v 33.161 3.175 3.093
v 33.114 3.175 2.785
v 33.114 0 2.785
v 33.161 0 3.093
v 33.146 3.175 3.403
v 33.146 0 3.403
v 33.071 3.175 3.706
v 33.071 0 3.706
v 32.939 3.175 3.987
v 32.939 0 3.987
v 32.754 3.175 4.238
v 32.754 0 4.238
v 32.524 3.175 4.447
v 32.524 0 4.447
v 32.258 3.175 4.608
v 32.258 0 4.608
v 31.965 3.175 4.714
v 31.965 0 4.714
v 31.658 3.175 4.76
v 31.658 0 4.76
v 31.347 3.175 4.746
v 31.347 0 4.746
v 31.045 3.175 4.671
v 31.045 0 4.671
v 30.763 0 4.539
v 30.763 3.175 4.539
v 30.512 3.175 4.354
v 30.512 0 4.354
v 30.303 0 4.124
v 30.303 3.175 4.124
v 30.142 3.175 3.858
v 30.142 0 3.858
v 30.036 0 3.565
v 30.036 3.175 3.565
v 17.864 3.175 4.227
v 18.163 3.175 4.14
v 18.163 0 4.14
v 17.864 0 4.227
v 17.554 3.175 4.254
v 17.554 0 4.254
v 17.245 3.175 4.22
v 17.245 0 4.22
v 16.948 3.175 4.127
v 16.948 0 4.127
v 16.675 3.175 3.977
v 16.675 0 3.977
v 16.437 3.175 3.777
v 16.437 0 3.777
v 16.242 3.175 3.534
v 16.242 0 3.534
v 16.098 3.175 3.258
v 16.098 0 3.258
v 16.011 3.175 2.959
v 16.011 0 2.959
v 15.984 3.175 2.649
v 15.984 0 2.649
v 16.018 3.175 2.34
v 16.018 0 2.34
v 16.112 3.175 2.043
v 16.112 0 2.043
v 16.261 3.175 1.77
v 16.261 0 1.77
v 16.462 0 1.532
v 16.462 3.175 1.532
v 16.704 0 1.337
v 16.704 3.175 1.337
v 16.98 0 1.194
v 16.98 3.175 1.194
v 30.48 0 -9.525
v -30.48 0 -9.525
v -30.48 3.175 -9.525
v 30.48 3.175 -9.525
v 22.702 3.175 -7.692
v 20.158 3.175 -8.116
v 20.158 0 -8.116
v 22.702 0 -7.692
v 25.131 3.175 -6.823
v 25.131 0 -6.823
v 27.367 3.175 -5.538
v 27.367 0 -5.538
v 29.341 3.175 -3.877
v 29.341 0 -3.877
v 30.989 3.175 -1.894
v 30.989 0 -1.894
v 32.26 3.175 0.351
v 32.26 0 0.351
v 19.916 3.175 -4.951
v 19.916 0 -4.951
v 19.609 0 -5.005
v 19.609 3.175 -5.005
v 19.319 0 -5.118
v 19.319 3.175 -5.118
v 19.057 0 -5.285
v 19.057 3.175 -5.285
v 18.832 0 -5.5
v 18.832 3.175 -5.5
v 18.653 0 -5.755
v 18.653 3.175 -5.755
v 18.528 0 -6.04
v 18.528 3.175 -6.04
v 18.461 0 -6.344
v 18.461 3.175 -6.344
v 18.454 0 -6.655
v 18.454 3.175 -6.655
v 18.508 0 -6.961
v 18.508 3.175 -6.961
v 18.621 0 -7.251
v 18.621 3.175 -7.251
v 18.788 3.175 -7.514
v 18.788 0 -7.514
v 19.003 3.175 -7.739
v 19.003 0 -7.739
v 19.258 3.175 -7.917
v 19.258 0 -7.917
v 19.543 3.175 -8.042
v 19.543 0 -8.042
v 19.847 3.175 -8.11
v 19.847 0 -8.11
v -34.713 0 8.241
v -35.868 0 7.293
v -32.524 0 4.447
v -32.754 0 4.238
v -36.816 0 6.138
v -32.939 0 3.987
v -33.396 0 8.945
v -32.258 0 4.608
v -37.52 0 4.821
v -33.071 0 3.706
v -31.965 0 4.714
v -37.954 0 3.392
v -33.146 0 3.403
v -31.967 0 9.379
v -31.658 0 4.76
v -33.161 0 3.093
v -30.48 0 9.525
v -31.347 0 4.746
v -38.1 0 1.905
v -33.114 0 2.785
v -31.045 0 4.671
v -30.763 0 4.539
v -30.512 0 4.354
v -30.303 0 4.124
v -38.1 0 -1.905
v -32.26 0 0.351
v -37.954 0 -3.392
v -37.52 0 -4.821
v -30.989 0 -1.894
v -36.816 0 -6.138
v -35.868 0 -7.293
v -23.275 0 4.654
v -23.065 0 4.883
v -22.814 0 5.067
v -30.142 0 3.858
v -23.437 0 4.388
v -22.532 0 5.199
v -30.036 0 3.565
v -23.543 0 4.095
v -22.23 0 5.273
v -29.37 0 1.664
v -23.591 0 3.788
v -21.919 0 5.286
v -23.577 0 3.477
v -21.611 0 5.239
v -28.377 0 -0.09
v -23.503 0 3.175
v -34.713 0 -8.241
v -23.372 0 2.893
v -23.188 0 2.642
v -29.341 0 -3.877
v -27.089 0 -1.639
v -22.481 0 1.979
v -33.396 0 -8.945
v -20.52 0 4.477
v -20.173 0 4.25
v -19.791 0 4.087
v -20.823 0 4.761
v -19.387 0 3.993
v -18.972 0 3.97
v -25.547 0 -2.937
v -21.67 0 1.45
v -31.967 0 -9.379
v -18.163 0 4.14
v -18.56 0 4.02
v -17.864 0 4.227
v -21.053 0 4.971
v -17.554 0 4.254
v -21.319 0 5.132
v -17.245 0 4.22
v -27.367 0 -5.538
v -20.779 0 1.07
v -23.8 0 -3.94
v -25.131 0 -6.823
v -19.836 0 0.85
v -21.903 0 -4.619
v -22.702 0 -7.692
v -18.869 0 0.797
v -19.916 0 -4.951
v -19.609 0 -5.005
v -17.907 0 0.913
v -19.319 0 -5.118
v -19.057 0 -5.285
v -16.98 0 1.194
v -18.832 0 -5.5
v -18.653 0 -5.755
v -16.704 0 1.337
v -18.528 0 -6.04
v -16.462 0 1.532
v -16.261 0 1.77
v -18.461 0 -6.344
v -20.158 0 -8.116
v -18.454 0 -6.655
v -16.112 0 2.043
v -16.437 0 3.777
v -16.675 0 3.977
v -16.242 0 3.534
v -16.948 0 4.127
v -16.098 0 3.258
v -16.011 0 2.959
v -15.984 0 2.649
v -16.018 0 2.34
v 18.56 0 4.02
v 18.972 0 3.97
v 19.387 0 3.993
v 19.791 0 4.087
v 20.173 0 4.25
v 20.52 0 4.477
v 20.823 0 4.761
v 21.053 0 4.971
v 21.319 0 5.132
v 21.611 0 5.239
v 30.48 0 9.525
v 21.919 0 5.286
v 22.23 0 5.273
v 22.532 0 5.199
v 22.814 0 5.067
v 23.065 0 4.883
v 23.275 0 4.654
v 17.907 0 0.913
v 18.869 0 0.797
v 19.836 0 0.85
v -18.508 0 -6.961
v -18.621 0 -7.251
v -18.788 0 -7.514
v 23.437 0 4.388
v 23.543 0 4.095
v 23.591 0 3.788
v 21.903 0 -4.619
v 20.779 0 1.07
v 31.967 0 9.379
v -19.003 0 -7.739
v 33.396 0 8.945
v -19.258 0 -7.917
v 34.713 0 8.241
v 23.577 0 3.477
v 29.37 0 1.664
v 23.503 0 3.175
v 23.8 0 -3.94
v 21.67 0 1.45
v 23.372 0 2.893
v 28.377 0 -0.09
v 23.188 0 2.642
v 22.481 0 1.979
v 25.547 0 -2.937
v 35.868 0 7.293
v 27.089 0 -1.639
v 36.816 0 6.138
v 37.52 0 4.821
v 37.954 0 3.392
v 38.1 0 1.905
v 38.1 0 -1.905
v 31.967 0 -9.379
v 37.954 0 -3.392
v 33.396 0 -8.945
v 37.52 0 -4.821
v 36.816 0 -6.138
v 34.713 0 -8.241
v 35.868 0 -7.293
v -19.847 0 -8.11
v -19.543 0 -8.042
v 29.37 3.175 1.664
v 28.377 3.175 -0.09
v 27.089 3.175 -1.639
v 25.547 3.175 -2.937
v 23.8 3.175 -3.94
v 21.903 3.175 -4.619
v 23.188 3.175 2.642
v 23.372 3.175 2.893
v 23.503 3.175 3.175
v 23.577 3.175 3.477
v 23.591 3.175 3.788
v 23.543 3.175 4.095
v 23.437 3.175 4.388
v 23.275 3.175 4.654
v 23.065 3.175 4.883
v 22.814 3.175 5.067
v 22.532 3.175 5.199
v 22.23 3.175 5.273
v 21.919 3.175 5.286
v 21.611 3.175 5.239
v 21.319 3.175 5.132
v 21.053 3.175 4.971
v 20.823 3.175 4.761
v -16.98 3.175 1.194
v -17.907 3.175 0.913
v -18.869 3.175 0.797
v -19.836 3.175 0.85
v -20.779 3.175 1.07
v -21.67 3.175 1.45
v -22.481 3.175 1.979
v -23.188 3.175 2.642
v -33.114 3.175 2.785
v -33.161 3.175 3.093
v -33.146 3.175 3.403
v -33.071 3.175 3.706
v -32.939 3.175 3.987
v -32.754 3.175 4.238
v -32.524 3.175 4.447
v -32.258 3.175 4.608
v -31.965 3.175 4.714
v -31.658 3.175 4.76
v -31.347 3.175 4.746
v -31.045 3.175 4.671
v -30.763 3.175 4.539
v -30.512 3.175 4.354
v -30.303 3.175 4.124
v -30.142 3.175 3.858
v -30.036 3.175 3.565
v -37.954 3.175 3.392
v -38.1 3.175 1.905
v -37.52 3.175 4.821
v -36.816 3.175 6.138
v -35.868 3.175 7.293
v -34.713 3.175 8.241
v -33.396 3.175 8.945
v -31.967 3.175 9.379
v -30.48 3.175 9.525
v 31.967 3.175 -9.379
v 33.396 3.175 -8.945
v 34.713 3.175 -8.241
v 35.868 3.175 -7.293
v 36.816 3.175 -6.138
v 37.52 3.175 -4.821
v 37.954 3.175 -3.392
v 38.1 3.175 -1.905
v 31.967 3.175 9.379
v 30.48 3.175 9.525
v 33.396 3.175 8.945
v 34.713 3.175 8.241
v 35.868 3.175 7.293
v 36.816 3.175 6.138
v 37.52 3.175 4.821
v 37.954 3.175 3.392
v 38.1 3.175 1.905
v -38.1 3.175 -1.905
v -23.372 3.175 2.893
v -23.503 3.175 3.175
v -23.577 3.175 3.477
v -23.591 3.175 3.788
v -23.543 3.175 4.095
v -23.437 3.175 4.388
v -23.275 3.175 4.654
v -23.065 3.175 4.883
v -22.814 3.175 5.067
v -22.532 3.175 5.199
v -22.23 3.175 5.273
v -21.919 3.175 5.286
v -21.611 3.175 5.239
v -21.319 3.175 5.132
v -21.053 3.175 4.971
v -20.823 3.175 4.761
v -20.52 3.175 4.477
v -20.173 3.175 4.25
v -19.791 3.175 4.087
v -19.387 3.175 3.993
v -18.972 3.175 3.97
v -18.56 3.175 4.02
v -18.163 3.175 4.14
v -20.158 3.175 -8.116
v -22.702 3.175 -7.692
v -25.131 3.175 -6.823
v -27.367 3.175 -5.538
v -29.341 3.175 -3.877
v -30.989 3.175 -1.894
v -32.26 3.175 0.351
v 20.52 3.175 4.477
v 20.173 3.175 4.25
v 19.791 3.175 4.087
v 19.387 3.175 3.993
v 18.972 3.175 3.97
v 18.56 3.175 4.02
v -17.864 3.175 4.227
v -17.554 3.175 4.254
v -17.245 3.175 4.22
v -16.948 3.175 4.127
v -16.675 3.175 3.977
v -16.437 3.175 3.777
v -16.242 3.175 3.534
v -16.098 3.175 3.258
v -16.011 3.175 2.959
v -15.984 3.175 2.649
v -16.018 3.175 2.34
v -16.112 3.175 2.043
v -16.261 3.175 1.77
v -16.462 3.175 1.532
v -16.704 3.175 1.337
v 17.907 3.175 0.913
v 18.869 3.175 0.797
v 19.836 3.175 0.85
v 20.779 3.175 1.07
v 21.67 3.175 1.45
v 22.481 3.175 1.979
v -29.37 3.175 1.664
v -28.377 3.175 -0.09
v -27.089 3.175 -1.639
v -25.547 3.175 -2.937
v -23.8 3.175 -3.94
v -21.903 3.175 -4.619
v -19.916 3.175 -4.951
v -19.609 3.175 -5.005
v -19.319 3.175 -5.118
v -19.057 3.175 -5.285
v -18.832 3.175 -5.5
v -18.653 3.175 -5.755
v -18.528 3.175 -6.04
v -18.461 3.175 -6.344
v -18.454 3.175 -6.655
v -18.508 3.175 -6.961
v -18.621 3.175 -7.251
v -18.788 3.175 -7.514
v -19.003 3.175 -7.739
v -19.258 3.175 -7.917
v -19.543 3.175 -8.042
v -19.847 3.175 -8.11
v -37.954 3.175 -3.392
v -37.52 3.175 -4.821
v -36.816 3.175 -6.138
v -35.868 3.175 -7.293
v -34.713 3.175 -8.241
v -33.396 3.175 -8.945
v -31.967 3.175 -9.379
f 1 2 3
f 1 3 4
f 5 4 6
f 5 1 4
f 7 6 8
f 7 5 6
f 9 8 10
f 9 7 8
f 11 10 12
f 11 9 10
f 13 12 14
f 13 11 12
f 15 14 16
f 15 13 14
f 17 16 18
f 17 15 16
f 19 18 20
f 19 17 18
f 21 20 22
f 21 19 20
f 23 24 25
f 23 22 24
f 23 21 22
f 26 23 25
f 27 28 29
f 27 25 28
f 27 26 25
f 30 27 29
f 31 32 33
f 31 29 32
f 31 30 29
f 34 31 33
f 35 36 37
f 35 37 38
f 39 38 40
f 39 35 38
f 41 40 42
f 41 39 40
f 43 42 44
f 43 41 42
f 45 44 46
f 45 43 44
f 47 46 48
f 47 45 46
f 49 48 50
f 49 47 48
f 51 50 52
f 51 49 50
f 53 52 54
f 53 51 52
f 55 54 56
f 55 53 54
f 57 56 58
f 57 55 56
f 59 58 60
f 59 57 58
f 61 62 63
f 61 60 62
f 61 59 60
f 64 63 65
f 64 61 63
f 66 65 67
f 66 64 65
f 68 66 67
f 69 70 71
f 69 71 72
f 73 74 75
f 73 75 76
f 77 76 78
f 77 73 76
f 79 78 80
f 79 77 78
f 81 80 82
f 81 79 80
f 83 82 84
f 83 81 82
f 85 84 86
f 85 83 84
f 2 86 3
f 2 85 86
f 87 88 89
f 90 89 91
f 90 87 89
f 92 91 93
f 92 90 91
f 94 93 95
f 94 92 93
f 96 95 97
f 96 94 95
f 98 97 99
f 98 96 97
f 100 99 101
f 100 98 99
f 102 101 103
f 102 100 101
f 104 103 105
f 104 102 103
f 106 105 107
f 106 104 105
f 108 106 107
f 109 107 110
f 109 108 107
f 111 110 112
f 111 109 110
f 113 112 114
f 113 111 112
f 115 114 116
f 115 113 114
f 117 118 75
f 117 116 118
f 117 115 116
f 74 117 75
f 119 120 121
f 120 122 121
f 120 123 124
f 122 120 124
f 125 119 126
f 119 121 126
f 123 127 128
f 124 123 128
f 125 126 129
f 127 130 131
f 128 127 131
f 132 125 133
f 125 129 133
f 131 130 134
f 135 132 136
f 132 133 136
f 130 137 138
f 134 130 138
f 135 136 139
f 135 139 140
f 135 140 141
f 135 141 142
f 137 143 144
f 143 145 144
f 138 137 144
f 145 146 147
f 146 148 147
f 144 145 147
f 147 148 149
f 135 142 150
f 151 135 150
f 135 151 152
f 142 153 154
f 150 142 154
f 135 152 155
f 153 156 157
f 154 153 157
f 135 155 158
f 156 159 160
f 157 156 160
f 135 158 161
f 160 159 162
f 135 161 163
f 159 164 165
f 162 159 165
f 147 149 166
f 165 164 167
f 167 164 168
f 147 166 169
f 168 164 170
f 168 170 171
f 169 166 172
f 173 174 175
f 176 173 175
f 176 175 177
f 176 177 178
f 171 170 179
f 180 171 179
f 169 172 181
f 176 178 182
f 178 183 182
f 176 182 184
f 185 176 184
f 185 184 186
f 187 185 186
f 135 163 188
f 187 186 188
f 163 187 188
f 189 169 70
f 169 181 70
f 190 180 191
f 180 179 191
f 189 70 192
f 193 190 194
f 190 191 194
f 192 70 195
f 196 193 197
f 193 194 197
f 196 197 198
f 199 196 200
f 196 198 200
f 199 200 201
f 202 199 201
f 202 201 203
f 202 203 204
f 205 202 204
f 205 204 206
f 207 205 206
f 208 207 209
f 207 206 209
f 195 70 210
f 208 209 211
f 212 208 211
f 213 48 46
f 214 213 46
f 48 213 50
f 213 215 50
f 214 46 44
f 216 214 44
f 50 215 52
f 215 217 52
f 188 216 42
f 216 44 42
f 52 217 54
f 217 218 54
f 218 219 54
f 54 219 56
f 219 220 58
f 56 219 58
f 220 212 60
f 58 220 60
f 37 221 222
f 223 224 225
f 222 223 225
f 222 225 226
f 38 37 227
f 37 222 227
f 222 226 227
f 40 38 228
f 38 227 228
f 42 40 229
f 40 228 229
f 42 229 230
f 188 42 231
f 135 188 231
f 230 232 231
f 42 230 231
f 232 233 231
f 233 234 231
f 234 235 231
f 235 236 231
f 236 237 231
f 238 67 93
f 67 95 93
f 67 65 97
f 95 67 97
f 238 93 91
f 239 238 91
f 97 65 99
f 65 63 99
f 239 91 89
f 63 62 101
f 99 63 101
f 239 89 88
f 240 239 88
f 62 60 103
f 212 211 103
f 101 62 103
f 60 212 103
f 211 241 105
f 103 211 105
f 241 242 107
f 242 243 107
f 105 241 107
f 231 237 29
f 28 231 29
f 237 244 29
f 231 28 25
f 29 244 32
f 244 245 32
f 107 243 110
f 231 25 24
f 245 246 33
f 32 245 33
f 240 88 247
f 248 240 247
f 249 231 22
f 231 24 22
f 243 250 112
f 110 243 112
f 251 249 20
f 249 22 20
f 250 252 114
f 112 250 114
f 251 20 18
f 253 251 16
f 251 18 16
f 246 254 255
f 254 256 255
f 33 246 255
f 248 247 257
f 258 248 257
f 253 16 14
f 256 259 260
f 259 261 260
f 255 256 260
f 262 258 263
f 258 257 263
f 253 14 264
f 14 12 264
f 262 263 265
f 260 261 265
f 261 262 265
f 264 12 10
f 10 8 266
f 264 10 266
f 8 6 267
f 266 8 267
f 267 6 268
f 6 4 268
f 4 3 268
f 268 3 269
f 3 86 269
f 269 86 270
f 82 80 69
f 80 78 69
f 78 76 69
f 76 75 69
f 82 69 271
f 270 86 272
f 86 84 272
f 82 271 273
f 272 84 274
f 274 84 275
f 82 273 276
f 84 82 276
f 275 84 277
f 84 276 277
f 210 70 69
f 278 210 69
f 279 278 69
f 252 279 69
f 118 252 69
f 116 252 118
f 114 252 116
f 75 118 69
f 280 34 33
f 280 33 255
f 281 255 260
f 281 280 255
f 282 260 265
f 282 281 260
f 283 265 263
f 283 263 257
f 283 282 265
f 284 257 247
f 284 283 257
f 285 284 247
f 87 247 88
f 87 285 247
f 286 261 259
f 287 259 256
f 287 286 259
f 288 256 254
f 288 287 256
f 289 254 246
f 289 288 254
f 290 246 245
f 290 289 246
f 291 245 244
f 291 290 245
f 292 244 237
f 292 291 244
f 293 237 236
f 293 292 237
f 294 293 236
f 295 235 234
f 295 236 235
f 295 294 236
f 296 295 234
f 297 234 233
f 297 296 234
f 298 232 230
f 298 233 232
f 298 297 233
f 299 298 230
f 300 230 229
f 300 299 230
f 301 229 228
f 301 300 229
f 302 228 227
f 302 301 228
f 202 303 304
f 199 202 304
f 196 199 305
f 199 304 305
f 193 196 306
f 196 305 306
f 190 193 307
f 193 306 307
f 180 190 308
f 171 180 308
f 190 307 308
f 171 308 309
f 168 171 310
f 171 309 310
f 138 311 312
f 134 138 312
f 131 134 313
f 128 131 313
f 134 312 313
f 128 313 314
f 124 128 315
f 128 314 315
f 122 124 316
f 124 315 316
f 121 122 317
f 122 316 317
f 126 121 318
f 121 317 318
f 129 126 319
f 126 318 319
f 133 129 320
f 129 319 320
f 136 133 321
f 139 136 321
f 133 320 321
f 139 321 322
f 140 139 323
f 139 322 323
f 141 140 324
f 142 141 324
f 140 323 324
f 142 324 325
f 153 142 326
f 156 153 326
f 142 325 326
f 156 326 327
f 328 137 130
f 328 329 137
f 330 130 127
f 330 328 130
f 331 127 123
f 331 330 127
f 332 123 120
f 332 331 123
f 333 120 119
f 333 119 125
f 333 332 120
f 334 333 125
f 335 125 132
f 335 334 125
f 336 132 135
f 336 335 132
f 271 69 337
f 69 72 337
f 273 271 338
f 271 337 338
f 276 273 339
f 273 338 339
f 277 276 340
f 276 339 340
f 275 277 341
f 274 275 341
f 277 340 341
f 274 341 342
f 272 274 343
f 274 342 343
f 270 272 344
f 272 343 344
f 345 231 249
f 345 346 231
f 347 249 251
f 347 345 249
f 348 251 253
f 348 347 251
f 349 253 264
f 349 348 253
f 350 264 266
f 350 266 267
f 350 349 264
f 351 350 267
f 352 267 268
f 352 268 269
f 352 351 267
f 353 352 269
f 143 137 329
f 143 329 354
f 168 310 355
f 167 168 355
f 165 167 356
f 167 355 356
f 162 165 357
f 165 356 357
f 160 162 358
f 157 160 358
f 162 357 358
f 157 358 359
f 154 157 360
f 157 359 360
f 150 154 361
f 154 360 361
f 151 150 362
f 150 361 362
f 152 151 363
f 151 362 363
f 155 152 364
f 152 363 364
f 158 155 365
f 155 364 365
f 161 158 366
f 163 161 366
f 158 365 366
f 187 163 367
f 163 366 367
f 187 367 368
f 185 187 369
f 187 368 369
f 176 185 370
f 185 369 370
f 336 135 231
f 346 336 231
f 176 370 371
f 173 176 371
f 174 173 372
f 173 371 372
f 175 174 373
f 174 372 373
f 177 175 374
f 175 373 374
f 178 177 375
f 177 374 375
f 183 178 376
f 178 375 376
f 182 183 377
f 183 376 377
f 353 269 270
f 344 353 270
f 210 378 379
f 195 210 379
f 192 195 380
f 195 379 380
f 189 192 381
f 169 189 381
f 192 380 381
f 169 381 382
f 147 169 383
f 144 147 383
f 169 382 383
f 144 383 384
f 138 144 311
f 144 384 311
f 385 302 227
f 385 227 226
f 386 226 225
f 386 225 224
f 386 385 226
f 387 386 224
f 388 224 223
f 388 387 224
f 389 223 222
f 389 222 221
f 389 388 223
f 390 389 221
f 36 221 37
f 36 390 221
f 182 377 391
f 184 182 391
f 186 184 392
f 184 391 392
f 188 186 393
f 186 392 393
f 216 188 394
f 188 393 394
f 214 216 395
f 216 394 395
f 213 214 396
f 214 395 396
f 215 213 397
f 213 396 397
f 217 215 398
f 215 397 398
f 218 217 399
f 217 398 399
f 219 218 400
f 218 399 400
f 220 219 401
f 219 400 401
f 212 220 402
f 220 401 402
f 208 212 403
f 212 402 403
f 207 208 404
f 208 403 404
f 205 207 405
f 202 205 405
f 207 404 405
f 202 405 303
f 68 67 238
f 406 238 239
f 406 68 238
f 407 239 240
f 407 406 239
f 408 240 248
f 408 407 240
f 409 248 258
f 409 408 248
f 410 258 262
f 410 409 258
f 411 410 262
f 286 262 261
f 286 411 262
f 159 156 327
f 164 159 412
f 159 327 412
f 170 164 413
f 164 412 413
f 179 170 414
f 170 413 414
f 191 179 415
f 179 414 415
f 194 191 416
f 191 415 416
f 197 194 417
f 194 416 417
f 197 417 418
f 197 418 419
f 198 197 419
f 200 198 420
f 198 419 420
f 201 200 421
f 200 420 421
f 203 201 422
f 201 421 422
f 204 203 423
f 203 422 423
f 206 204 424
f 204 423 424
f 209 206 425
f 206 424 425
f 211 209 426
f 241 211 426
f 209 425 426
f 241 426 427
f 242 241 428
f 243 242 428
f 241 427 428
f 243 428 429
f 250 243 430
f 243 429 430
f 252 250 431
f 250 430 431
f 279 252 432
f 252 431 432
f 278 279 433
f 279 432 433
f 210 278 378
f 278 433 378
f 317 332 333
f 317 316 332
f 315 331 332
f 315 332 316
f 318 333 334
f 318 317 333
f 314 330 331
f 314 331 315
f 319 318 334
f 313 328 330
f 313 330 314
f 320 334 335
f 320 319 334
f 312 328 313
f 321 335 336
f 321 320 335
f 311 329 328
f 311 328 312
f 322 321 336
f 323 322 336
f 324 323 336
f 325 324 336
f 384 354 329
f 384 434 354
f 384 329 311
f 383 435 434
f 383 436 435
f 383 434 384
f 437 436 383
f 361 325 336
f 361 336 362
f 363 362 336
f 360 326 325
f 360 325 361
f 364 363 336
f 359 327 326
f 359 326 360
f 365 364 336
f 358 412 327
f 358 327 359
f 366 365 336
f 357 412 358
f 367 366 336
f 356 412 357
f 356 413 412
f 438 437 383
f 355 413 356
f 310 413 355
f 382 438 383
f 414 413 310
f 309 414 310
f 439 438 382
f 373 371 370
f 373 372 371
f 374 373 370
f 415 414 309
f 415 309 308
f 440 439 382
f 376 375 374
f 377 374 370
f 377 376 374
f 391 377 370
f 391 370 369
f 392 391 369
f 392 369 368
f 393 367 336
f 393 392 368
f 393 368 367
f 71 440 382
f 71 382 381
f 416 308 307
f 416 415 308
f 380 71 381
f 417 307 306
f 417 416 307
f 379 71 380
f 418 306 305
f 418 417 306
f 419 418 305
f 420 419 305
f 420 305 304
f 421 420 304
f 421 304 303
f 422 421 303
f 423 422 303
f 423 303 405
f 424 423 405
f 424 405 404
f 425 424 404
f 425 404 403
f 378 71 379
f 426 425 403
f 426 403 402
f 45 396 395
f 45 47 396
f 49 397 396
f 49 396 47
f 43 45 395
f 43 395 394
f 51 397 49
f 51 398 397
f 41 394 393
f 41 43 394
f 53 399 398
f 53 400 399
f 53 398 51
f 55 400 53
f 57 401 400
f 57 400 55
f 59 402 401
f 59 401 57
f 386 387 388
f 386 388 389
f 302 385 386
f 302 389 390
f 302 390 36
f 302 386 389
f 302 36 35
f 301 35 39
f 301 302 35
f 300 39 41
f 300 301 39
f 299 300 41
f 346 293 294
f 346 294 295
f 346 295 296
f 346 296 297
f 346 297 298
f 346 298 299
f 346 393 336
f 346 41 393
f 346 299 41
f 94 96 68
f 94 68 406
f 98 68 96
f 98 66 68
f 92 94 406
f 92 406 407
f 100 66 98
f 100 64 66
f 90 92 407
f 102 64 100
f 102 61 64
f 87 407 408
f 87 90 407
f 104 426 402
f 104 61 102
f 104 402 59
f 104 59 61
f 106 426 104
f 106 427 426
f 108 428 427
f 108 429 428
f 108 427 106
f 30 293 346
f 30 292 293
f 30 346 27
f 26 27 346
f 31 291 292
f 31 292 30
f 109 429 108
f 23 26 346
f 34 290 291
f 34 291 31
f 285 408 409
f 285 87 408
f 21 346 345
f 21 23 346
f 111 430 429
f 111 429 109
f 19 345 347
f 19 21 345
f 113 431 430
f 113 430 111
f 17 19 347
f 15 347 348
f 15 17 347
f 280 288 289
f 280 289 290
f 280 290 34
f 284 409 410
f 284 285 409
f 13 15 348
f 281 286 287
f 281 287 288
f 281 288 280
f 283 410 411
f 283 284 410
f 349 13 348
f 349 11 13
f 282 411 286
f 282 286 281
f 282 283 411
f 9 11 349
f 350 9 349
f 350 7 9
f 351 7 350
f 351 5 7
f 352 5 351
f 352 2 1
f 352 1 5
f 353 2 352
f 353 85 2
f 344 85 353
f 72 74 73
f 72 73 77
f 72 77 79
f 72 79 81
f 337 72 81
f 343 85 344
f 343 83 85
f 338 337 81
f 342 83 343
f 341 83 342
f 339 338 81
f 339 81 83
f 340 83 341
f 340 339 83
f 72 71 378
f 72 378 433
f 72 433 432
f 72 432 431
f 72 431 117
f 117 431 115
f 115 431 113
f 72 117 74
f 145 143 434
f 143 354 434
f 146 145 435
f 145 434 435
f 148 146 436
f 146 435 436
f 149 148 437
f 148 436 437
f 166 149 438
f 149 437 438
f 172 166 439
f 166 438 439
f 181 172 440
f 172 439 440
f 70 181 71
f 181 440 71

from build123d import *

# Parameters (mm, degrees)
SKETCH1_W           = 76.2
SKETCH1_H           = 19.05
BOSS_EXTRUDE1_DEPTH = 3.175
CUT_EXTRUDE1_DEPTH  = 40.400713826
FILLET1_R           = 7.62


with BuildPart() as part:
    # Sketch1 → Boss-Extrude1 (new body)
    with BuildSketch(Plane(origin=(0, 0, 0), x_dir=(1, 0, 0), z_dir=(0, 1, 0))):
        Rectangle(SKETCH1_W, SKETCH1_H)
    extrude(amount=BOSS_EXTRUDE1_DEPTH)

    # Sketch6 → Cut-Extrude1 (cut, through all)
    with BuildSketch(Plane(origin=(0, 3.175, 0), x_dir=(1, 0, 0), z_dir=(0, 1, 0))):
        with BuildLine():
            ThreePointArc((-20.158139463, 8.116433777), (-28.391214829, 4.751683872), (-33.113993118, -2.784922601))
            ThreePointArc((-33.113993118, -2.784922601), (-31.965241133, -4.713829384), (-30.03633435, -3.565077399))
            ThreePointArc((-30.03633435, -3.565077399), (-26.347053439, 2.322274641), (-19.915642535, 4.950707914))
            ThreePointArc((-19.915642535, 4.950707914), (-18.454028067, 6.654819309), (-20.158139463, 8.116433777))
        make_face()
        with BuildLine():
            ThreePointArc((-16.980295432, -1.193621711), (-20.312174356, -0.939008413), (-23.187529976, -2.641528649))
            ThreePointArc((-23.187529976, -2.641528649), (-23.064941797, -4.883243314), (-20.823227132, -4.760655135))
            ThreePointArc((-20.823227132, -4.760655135), (-19.590931867, -4.031003605), (-18.162983757, -4.14012359))
            ThreePointArc((-18.162983757, -4.14012359), (-16.098388655, -3.258216813), (-16.980295432, -1.193621711))
        make_face()
        with BuildLine():
            ThreePointArc((16.980295432, -1.193621711), (20.312174356, -0.939008413), (23.187529976, -2.641528649))
            ThreePointArc((23.187529976, -2.641528649), (23.064941797, -4.883243314), (20.823227132, -4.760655135))
            ThreePointArc((20.823227132, -4.760655135), (19.590931867, -4.031003605), (18.162983757, -4.14012359))
            ThreePointArc((18.162983757, -4.14012359), (16.098388655, -3.258216813), (16.980295432, -1.193621711))
        make_face()
        with BuildLine():
            ThreePointArc((20.158139463, 8.116433777), (28.391214829, 4.751683872), (33.113993118, -2.784922601))
            ThreePointArc((33.113993118, -2.784922601), (31.965241133, -4.713829384), (30.03633435, -3.565077399))
            ThreePointArc((30.03633435, -3.565077399), (26.347053439, 2.322274641), (19.915642535, 4.950707914))
            ThreePointArc((19.915642535, 4.950707914), (18.454028067, 6.654819309), (20.158139463, 8.116433777))
        make_face()
    extrude(amount=-CUT_EXTRUDE1_DEPTH, mode=Mode.SUBTRACT)

    # Fillet1
    fillet1_edges = [part.edges().sort_by_distance(p)[0] for p in [
        (38.1, 1.5875, 9.525),
        (-38.1, 1.5875, 9.525),
        (-38.1, 1.5875, -9.525),
        (38.1, 1.5875, -9.525),
    ]]
    fillet(fillet1_edges, radius=FILLET1_R)


solid = part.part
